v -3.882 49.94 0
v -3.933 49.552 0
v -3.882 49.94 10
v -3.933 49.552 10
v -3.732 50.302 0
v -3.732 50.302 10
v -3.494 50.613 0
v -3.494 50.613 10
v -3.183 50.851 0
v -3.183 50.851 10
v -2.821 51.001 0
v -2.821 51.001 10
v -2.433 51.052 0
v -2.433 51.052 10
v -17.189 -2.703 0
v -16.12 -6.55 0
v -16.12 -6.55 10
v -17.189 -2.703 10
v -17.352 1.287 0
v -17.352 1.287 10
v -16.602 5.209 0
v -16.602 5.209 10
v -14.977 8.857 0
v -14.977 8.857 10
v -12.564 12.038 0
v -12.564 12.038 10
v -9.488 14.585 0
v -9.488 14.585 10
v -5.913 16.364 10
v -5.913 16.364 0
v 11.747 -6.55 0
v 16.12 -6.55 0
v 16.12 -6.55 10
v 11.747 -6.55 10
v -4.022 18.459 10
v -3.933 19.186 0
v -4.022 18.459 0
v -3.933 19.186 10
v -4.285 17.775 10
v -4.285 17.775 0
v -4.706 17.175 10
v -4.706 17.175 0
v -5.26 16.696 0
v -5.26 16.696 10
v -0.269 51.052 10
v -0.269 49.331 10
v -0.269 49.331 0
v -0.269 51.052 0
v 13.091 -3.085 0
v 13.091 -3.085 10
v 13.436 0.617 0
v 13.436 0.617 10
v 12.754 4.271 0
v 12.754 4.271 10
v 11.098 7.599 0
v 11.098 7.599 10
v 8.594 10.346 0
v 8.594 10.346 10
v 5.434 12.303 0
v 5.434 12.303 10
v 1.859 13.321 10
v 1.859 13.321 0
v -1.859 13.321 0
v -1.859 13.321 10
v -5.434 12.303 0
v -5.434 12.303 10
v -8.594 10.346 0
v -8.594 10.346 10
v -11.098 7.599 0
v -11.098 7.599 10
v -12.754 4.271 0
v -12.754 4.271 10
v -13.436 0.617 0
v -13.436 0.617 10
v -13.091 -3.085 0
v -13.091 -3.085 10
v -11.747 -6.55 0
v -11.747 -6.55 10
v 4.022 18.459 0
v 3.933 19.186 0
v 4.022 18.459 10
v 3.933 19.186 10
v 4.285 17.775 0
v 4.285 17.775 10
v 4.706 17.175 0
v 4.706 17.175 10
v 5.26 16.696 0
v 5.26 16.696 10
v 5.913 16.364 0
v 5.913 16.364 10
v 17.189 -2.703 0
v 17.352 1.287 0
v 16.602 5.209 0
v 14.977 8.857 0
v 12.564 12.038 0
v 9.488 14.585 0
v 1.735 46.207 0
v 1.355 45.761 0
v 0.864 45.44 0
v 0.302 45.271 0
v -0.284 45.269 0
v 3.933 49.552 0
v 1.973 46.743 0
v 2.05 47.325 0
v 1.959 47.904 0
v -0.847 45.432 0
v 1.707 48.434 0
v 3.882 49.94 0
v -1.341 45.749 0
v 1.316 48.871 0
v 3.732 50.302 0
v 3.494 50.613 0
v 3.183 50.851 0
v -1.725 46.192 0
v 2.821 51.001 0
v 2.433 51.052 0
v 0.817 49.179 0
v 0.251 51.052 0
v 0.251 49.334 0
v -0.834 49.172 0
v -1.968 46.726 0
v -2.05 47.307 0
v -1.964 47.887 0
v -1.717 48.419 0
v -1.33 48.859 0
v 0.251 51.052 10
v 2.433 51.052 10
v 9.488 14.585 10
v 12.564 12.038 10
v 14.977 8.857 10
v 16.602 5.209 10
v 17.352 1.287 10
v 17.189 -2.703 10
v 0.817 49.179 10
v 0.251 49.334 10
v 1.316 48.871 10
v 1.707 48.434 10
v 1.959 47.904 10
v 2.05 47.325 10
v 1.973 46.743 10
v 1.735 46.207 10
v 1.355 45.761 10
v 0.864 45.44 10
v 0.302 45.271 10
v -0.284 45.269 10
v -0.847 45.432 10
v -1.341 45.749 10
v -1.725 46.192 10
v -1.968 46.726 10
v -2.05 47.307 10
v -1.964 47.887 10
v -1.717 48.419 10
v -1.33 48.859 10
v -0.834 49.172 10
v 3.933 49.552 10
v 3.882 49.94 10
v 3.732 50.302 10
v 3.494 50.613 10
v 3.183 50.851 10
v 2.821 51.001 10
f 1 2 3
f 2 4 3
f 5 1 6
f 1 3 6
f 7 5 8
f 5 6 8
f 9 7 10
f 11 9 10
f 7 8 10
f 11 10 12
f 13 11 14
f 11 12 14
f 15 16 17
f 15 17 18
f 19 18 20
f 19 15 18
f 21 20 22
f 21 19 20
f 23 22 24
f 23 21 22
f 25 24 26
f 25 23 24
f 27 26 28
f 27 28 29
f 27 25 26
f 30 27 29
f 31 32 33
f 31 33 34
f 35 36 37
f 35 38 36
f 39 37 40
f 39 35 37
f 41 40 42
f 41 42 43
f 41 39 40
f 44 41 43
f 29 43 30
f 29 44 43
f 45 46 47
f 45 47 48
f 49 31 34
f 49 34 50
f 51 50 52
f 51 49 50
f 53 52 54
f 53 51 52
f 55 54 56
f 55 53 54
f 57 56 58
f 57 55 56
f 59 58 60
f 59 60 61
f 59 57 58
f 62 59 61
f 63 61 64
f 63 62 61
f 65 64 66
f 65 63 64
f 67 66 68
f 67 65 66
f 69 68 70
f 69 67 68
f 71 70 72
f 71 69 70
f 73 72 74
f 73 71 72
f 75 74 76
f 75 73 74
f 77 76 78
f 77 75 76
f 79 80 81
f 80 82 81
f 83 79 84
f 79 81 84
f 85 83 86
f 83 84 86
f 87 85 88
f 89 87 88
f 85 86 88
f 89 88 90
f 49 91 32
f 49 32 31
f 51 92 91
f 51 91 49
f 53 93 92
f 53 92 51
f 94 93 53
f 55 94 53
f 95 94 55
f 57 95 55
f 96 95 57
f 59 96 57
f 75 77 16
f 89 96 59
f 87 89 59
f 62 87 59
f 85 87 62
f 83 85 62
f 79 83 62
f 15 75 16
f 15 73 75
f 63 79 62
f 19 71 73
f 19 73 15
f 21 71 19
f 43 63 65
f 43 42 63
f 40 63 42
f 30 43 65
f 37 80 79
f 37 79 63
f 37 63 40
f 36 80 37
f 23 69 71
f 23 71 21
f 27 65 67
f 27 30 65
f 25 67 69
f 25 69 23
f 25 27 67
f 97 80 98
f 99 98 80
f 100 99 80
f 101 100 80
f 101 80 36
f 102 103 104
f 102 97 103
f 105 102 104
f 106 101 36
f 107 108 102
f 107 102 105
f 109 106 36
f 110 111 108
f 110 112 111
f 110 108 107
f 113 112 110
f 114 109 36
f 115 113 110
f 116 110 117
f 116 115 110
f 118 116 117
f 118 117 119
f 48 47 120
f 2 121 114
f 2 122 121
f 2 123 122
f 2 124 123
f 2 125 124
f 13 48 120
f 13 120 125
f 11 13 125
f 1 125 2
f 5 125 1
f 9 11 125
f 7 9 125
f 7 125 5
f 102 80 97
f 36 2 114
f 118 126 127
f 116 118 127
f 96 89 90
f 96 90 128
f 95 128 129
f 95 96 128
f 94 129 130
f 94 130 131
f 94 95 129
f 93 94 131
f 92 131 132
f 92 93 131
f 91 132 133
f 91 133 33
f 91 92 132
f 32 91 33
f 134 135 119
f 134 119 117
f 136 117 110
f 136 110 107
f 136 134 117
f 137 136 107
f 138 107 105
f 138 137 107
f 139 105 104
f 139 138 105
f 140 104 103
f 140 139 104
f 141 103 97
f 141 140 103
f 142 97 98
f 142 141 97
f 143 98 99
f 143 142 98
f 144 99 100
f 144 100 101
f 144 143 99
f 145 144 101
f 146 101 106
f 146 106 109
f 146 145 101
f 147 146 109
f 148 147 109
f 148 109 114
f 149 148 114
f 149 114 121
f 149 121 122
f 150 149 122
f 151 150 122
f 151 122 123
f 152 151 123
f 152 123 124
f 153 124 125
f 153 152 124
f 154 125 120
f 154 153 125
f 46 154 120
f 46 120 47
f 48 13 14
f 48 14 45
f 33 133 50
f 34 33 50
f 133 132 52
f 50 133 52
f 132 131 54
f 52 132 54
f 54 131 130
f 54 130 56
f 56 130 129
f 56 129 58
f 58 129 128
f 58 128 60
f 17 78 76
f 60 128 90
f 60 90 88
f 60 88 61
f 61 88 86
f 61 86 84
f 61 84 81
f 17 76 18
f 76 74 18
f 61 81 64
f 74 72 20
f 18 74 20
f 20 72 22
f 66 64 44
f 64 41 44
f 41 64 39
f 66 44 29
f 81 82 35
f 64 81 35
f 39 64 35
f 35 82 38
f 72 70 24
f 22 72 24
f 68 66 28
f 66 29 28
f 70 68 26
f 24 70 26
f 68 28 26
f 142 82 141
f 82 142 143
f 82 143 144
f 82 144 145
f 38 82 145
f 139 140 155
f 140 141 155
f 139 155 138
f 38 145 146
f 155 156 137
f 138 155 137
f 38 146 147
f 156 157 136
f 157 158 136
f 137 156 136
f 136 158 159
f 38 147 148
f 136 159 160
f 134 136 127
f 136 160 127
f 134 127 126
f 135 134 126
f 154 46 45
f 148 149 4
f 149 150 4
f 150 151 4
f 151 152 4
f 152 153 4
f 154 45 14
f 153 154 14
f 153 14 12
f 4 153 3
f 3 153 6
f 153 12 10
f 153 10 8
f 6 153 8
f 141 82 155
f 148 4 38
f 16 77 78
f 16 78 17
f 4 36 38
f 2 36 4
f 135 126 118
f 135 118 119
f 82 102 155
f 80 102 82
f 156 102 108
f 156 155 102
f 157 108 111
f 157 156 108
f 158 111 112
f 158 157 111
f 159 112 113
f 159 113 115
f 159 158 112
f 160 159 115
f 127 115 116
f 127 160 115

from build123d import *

# Parameters (mm, degrees)
BOSS_EXTRUDE1_DEPTH = 10
FILLET1_R           = 1.5
FILLET2_R           = 3
CUT_EXTRUDE1_DEPTH  = 10


with BuildPart() as part:
    # Sketch1 → Boss-Extrude1 (new body)
    with BuildSketch(Plane.XY):
        with BuildLine():
            Line((3.932919229, 51.05226265), (3.932919229, 16.949694579))
            ThreePointArc((3.932919229, 16.949694579), (15.446427165, 8.010486117), (16.11997205, -6.550305421))
            Line((16.11997205, -6.550305421), (11.747169825, -6.550305421))
            ThreePointArc((11.747169825, -6.550305421), (0, 13.45), (-11.747169825, -6.550305421))
            Line((-11.747169825, -6.550305421), (-16.11997205, -6.550305421))
            ThreePointArc((-16.11997205, -6.550305421), (-15.446427165, 8.010486117), (-3.932919229, 16.949694579))
            Line((-3.932919229, 16.949694579), (-3.932919229, 51.05226265))
            Line((-3.932919229, 51.05226265), (3.932919229, 51.05226265))
        make_face()
    extrude(amount=BOSS_EXTRUDE1_DEPTH)

    # Fillet1
    fillet1_edges = [part.edges().sort_by_distance(p)[0] for p in [
        (-3.932919229, 51.05226265, 5),
        (3.932919229, 51.05226265, 5),
    ]]
    fillet(fillet1_edges, radius=FILLET1_R)

    # Fillet2
    fillet2_edges = [part.edges().sort_by_distance(p)[0] for p in [
        (-3.932919229, 16.949694579, 5),
        (3.932919229, 16.949694579, 5),
    ]]
    fillet(fillet2_edges, radius=FILLET2_R)

    # Sketch3 → Cut-Extrude1 (cut)
    with BuildSketch(Plane.XY.offset(10)):
        with BuildLine():
            Line((-0.269258516, 49.33121061), (-0.269258516, 51.05226265))
            Line((-0.269258516, 51.05226265), (0.251212815, 51.05226265))
            Line((0.251212815, 51.05226265), (0.251212815, 49.333520115))
            ThreePointArc((0.251212815, 49.333520115), (0.009096443, 45.248990685), (-0.269258516, 49.33121061))
        make_face()
    extrude(amount=-CUT_EXTRUDE1_DEPTH, mode=Mode.SUBTRACT)


solid = part.part
